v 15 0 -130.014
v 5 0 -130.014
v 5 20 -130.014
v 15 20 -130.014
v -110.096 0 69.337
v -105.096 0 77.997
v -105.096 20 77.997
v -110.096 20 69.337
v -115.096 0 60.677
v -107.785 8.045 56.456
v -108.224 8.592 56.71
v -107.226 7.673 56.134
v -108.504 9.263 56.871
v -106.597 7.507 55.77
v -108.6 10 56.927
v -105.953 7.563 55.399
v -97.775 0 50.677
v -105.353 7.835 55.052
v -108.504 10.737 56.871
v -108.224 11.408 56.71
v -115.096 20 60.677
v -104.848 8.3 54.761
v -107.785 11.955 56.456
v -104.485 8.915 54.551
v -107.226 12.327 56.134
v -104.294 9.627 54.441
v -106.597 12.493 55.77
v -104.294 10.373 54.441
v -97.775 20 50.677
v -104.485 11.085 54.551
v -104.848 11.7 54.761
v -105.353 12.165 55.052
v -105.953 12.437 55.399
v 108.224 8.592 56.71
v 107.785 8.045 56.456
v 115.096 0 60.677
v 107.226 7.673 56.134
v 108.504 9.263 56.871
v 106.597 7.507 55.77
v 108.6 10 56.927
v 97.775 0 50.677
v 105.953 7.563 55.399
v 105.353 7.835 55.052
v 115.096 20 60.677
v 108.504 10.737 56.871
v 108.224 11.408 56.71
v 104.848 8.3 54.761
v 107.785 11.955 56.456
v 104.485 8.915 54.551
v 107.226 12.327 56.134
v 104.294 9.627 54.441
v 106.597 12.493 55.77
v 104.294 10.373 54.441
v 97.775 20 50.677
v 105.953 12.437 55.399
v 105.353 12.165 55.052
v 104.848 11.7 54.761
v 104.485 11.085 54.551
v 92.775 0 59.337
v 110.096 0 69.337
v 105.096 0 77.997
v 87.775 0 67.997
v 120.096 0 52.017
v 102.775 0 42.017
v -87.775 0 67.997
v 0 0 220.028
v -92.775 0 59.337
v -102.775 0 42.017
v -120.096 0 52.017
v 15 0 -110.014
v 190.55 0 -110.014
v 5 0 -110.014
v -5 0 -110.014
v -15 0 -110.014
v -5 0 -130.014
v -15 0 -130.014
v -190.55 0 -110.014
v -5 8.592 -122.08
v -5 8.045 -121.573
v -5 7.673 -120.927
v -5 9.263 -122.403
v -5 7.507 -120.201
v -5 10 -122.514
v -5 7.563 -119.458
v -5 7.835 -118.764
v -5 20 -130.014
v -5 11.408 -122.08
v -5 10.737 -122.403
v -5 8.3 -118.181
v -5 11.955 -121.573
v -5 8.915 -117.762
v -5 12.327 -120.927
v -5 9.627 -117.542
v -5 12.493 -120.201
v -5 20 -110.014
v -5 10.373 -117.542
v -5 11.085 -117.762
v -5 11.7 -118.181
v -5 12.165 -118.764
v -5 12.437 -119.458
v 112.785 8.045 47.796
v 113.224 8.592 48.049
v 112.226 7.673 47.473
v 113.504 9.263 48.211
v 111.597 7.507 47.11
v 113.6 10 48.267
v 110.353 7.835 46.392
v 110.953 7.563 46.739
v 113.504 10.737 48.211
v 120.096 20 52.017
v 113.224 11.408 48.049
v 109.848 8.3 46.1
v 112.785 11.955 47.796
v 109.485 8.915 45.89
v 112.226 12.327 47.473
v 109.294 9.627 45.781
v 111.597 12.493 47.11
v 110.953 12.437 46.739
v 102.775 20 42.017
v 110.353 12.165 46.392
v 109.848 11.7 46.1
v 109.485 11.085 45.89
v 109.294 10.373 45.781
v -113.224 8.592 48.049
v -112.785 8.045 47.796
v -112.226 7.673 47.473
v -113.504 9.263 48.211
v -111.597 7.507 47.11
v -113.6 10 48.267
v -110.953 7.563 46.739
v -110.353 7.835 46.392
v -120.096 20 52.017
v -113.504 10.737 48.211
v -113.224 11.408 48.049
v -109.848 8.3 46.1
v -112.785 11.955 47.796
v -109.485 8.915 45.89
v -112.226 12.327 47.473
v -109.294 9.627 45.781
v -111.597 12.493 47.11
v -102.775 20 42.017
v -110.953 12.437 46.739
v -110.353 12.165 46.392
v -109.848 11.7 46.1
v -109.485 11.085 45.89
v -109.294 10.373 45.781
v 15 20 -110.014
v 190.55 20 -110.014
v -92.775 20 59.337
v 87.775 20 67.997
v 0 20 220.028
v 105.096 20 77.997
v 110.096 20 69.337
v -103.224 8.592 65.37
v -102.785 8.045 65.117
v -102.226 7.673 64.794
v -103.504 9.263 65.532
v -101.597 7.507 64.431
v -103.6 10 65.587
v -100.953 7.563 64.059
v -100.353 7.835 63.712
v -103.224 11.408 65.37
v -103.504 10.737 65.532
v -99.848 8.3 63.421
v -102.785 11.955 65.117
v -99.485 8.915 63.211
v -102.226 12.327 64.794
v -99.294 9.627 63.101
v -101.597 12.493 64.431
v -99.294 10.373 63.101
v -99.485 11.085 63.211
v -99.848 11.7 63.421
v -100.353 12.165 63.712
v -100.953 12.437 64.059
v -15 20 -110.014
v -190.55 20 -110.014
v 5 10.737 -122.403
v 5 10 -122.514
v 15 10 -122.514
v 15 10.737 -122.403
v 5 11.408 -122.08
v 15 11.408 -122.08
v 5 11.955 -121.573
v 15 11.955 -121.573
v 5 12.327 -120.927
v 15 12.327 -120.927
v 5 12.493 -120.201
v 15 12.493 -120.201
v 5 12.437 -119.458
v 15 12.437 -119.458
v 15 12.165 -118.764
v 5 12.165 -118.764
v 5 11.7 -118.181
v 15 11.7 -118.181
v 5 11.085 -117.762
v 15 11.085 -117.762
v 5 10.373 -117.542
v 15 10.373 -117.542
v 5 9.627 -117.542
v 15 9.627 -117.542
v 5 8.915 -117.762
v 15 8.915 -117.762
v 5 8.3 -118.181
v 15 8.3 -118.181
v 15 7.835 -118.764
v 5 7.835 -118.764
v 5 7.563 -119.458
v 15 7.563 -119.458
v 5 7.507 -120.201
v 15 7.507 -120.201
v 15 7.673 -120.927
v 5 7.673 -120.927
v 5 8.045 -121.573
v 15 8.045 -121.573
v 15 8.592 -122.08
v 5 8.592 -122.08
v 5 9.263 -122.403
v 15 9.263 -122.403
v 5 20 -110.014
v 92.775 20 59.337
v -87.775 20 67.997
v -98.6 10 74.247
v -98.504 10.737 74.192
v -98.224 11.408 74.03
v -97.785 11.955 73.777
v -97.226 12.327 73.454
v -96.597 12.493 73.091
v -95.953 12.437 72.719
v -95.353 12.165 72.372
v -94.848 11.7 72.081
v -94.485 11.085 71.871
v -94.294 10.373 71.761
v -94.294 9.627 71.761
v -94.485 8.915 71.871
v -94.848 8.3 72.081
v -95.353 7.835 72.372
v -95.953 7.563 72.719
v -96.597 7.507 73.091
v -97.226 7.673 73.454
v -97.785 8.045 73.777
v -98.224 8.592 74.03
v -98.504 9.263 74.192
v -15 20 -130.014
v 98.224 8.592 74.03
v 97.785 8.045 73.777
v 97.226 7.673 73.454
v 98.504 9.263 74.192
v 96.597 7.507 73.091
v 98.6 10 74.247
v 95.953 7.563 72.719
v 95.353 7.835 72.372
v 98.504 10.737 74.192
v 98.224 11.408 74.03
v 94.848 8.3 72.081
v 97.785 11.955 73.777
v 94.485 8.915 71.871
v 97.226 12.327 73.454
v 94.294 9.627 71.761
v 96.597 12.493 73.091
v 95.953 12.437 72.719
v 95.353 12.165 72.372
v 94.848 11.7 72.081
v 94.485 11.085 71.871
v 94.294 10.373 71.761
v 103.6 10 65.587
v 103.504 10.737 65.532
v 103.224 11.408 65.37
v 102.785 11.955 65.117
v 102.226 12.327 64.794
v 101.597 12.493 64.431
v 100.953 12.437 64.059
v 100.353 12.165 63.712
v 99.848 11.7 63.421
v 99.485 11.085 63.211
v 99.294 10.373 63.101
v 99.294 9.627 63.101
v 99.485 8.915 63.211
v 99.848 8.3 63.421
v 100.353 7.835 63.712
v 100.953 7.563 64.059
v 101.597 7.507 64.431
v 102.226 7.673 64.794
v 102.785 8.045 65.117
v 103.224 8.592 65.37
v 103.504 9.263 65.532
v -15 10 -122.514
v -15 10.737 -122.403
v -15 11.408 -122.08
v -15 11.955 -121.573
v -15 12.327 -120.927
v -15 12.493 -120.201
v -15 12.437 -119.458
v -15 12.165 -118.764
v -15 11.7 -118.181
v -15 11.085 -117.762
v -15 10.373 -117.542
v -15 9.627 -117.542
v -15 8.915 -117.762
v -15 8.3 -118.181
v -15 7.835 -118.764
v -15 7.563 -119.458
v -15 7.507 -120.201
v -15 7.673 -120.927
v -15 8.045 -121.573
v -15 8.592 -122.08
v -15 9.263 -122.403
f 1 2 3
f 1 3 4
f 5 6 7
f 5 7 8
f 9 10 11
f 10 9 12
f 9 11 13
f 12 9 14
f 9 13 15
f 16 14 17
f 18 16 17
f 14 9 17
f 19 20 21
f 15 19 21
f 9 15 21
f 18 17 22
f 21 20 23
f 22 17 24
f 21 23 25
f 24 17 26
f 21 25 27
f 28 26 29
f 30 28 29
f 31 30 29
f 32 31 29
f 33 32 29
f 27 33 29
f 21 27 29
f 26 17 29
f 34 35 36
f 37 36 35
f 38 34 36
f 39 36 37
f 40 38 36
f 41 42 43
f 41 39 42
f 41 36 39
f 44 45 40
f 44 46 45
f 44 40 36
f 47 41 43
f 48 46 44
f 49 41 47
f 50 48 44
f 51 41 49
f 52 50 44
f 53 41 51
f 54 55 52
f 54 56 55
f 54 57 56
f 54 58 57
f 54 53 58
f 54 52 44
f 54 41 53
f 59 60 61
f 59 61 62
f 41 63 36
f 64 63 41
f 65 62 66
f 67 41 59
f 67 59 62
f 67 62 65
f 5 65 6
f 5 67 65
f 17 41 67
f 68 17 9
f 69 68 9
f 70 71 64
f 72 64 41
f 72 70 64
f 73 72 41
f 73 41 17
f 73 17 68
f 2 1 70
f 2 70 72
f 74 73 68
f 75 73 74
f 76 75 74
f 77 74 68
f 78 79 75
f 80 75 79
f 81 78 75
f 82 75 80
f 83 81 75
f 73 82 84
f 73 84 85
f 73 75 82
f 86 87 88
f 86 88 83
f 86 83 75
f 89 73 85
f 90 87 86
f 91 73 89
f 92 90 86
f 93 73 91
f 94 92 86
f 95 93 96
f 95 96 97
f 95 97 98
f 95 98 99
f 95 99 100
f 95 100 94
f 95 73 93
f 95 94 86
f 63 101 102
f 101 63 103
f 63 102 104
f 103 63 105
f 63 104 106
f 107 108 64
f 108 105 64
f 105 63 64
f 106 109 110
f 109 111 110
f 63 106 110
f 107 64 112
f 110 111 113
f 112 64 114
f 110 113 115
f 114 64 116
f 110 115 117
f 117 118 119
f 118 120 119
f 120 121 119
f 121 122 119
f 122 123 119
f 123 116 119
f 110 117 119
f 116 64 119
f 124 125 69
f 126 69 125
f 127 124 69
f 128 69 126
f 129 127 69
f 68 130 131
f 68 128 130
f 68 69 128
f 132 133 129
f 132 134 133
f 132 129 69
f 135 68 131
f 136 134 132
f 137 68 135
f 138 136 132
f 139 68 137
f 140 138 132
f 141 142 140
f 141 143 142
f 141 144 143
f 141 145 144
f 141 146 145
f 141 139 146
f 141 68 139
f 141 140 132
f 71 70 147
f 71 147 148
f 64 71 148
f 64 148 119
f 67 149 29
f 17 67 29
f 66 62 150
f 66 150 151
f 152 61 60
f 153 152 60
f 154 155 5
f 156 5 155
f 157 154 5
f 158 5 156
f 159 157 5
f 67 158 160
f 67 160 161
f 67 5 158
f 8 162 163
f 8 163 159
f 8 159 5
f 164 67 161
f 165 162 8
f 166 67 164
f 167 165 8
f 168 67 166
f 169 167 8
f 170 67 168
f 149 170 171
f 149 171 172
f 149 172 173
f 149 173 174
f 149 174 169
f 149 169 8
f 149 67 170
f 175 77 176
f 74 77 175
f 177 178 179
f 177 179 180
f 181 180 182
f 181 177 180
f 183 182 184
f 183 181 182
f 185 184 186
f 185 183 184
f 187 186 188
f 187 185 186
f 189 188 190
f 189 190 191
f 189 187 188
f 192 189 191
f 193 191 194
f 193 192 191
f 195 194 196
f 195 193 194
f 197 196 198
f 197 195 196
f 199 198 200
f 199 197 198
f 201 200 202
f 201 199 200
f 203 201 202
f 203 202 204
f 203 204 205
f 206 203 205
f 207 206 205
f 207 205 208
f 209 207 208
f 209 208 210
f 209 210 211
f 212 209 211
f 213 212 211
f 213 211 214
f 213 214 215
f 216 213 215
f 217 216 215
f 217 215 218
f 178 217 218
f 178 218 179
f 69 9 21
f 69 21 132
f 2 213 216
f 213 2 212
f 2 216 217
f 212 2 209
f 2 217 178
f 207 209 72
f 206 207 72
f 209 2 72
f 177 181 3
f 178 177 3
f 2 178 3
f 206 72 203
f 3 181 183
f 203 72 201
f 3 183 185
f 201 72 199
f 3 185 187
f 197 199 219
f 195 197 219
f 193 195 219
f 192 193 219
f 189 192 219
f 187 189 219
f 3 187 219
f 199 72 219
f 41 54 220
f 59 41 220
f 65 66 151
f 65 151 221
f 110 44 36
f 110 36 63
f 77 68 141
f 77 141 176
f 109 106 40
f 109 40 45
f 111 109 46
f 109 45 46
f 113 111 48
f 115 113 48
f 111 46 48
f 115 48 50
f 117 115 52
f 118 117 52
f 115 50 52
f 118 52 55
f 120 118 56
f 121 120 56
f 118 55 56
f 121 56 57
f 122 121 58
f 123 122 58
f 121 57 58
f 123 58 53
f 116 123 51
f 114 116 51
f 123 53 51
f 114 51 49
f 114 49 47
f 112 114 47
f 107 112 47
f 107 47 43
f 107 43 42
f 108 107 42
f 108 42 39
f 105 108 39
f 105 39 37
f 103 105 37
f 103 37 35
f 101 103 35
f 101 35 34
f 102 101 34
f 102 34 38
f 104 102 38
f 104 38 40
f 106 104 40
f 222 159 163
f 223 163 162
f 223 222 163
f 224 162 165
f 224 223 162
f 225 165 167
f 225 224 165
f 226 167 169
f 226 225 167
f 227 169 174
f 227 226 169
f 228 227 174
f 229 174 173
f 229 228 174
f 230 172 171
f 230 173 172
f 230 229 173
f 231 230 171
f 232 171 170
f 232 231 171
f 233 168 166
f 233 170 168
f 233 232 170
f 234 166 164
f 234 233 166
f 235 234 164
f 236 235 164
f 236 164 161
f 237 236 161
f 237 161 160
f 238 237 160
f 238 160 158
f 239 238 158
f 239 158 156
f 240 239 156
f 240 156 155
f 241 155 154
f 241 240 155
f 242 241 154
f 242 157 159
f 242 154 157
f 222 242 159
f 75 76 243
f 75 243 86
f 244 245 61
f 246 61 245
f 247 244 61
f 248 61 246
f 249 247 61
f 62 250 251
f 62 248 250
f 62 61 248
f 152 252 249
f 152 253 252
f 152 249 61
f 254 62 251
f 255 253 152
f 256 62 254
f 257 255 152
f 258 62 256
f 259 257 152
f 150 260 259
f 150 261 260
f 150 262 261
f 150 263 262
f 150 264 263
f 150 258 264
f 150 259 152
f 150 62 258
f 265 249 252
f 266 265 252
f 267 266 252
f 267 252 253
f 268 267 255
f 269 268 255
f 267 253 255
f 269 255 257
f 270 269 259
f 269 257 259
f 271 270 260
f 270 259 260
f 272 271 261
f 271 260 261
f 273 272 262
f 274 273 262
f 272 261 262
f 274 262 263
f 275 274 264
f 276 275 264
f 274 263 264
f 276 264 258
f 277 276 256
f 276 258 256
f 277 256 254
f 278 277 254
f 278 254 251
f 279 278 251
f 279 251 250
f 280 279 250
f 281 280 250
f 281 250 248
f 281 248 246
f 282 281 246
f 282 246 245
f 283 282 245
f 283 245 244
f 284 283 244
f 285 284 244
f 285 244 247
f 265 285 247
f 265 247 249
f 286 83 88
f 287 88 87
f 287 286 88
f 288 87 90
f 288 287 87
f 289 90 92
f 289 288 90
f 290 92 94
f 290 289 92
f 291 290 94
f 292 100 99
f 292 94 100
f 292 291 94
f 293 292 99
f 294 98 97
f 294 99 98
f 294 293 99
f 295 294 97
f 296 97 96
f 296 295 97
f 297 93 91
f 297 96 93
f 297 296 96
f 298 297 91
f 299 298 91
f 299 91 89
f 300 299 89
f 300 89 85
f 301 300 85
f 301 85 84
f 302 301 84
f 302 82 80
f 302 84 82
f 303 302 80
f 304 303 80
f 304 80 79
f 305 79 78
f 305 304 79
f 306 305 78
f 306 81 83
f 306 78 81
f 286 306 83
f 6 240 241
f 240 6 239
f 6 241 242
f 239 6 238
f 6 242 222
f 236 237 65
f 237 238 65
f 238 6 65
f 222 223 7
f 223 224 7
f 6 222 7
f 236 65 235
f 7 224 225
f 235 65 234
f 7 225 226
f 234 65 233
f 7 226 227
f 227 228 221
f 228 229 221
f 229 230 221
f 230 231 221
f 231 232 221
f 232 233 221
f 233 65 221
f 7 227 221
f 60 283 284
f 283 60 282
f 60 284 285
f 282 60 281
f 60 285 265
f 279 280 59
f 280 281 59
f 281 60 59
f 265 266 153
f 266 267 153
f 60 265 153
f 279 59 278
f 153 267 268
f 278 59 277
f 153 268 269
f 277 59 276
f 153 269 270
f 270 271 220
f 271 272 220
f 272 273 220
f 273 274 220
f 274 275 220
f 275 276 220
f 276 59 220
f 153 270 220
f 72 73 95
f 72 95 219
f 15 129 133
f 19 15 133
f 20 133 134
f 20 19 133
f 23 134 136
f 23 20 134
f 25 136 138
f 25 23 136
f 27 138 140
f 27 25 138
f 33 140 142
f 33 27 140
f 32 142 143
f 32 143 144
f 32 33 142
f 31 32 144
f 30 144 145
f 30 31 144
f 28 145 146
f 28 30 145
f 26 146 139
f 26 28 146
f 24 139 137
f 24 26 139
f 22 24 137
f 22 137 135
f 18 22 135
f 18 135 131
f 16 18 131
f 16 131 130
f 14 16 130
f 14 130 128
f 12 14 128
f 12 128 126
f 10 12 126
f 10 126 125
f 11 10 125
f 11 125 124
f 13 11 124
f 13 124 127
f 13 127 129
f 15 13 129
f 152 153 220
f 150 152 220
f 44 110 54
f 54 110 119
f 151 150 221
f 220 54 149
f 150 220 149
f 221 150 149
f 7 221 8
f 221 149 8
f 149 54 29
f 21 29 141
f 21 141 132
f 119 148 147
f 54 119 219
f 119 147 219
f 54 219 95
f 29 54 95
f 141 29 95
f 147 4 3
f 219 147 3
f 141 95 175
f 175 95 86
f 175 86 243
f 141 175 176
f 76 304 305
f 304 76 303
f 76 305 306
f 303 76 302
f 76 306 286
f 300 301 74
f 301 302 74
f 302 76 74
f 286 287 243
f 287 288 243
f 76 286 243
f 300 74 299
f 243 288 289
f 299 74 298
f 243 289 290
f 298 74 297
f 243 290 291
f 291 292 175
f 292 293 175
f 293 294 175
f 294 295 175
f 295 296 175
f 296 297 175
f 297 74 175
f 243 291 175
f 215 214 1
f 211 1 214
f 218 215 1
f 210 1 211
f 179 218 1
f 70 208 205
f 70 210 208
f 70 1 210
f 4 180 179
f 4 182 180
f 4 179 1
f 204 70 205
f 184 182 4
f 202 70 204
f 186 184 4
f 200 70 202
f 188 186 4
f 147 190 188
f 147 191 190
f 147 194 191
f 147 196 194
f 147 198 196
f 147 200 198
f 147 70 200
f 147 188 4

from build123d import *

# Parameters (mm, degrees)
BOSS_EXTRUDE1_DEPTH = 20
SKETCH3_W           = 10
SKETCH3_H           = 20
BOSS_EXTRUDE2_DEPTH = 20
SKETCH4_R           = 2.5
CUT_EXTRUDE1_DEPTH  = 30


with BuildPart() as part:
    # Sketch2 → Boss-Extrude1 (new body)
    with BuildSketch(Plane(origin=(0, 0, 0), x_dir=(1, 0, 0), z_dir=(0, 1, 0))):
        Polygon((-190.55, 110.014093794), (190.55, 110.014093794), (0, -220.028187588), align=None)
    extrude(amount=BOSS_EXTRUDE1_DEPTH)

    # Sketch3 → Boss-Extrude2 (add)
    with BuildSketch(Plane(origin=(95.275, 0, 55.007046897), x_dir=(0.5, 0, -0.866025404), z_dir=(0.866025404, 0, 0.5))):
        with Locations((-10, 10)):
            Rectangle(SKETCH3_W, SKETCH3_H)
        with Locations((10, 10)):
            Rectangle(SKETCH3_W, SKETCH3_H)
    boss_extrude2 = extrude(amount=BOSS_EXTRUDE2_DEPTH)

    # Sketch4 → Cut-Extrude1 (cut)
    with BuildSketch(Plane(origin=(-7.5, 0, 12.990381057), x_dir=(0.866025404, 0, 0.5), z_dir=(-0.5, 0, 0.866025404))):
        with Locations((120.014093794, 10)):
            Circle(SKETCH4_R)
    cut_extrude1 = extrude(amount=-CUT_EXTRUDE1_DEPTH, mode=Mode.SUBTRACT)

    # Mirror1: Boss-Extrude2, Cut-Extrude1 across plane
    add(boss_extrude2.mirror(Plane(origin=(0, 0, 0), x_dir=(-0.866025404, 0, 0.5), z_dir=(0.5, 0, 0.866025404))))
    add(cut_extrude1.mirror(Plane(origin=(0, 0, 0), x_dir=(-0.866025404, 0, 0.5), z_dir=(0.5, 0, 0.866025404))), mode=Mode.SUBTRACT)

    # Mirror1 at the second plane: Boss-Extrude2, Cut-Extrude1 across plane
    add(boss_extrude2.mirror(Plane(origin=(0, 0, 0), x_dir=(0, 0, 1), z_dir=(1, 0, 0))))
    add(cut_extrude1.mirror(Plane(origin=(0, 0, 0), x_dir=(0, 0, 1), z_dir=(1, 0, 0))), mode=Mode.SUBTRACT)


solid = part.part
